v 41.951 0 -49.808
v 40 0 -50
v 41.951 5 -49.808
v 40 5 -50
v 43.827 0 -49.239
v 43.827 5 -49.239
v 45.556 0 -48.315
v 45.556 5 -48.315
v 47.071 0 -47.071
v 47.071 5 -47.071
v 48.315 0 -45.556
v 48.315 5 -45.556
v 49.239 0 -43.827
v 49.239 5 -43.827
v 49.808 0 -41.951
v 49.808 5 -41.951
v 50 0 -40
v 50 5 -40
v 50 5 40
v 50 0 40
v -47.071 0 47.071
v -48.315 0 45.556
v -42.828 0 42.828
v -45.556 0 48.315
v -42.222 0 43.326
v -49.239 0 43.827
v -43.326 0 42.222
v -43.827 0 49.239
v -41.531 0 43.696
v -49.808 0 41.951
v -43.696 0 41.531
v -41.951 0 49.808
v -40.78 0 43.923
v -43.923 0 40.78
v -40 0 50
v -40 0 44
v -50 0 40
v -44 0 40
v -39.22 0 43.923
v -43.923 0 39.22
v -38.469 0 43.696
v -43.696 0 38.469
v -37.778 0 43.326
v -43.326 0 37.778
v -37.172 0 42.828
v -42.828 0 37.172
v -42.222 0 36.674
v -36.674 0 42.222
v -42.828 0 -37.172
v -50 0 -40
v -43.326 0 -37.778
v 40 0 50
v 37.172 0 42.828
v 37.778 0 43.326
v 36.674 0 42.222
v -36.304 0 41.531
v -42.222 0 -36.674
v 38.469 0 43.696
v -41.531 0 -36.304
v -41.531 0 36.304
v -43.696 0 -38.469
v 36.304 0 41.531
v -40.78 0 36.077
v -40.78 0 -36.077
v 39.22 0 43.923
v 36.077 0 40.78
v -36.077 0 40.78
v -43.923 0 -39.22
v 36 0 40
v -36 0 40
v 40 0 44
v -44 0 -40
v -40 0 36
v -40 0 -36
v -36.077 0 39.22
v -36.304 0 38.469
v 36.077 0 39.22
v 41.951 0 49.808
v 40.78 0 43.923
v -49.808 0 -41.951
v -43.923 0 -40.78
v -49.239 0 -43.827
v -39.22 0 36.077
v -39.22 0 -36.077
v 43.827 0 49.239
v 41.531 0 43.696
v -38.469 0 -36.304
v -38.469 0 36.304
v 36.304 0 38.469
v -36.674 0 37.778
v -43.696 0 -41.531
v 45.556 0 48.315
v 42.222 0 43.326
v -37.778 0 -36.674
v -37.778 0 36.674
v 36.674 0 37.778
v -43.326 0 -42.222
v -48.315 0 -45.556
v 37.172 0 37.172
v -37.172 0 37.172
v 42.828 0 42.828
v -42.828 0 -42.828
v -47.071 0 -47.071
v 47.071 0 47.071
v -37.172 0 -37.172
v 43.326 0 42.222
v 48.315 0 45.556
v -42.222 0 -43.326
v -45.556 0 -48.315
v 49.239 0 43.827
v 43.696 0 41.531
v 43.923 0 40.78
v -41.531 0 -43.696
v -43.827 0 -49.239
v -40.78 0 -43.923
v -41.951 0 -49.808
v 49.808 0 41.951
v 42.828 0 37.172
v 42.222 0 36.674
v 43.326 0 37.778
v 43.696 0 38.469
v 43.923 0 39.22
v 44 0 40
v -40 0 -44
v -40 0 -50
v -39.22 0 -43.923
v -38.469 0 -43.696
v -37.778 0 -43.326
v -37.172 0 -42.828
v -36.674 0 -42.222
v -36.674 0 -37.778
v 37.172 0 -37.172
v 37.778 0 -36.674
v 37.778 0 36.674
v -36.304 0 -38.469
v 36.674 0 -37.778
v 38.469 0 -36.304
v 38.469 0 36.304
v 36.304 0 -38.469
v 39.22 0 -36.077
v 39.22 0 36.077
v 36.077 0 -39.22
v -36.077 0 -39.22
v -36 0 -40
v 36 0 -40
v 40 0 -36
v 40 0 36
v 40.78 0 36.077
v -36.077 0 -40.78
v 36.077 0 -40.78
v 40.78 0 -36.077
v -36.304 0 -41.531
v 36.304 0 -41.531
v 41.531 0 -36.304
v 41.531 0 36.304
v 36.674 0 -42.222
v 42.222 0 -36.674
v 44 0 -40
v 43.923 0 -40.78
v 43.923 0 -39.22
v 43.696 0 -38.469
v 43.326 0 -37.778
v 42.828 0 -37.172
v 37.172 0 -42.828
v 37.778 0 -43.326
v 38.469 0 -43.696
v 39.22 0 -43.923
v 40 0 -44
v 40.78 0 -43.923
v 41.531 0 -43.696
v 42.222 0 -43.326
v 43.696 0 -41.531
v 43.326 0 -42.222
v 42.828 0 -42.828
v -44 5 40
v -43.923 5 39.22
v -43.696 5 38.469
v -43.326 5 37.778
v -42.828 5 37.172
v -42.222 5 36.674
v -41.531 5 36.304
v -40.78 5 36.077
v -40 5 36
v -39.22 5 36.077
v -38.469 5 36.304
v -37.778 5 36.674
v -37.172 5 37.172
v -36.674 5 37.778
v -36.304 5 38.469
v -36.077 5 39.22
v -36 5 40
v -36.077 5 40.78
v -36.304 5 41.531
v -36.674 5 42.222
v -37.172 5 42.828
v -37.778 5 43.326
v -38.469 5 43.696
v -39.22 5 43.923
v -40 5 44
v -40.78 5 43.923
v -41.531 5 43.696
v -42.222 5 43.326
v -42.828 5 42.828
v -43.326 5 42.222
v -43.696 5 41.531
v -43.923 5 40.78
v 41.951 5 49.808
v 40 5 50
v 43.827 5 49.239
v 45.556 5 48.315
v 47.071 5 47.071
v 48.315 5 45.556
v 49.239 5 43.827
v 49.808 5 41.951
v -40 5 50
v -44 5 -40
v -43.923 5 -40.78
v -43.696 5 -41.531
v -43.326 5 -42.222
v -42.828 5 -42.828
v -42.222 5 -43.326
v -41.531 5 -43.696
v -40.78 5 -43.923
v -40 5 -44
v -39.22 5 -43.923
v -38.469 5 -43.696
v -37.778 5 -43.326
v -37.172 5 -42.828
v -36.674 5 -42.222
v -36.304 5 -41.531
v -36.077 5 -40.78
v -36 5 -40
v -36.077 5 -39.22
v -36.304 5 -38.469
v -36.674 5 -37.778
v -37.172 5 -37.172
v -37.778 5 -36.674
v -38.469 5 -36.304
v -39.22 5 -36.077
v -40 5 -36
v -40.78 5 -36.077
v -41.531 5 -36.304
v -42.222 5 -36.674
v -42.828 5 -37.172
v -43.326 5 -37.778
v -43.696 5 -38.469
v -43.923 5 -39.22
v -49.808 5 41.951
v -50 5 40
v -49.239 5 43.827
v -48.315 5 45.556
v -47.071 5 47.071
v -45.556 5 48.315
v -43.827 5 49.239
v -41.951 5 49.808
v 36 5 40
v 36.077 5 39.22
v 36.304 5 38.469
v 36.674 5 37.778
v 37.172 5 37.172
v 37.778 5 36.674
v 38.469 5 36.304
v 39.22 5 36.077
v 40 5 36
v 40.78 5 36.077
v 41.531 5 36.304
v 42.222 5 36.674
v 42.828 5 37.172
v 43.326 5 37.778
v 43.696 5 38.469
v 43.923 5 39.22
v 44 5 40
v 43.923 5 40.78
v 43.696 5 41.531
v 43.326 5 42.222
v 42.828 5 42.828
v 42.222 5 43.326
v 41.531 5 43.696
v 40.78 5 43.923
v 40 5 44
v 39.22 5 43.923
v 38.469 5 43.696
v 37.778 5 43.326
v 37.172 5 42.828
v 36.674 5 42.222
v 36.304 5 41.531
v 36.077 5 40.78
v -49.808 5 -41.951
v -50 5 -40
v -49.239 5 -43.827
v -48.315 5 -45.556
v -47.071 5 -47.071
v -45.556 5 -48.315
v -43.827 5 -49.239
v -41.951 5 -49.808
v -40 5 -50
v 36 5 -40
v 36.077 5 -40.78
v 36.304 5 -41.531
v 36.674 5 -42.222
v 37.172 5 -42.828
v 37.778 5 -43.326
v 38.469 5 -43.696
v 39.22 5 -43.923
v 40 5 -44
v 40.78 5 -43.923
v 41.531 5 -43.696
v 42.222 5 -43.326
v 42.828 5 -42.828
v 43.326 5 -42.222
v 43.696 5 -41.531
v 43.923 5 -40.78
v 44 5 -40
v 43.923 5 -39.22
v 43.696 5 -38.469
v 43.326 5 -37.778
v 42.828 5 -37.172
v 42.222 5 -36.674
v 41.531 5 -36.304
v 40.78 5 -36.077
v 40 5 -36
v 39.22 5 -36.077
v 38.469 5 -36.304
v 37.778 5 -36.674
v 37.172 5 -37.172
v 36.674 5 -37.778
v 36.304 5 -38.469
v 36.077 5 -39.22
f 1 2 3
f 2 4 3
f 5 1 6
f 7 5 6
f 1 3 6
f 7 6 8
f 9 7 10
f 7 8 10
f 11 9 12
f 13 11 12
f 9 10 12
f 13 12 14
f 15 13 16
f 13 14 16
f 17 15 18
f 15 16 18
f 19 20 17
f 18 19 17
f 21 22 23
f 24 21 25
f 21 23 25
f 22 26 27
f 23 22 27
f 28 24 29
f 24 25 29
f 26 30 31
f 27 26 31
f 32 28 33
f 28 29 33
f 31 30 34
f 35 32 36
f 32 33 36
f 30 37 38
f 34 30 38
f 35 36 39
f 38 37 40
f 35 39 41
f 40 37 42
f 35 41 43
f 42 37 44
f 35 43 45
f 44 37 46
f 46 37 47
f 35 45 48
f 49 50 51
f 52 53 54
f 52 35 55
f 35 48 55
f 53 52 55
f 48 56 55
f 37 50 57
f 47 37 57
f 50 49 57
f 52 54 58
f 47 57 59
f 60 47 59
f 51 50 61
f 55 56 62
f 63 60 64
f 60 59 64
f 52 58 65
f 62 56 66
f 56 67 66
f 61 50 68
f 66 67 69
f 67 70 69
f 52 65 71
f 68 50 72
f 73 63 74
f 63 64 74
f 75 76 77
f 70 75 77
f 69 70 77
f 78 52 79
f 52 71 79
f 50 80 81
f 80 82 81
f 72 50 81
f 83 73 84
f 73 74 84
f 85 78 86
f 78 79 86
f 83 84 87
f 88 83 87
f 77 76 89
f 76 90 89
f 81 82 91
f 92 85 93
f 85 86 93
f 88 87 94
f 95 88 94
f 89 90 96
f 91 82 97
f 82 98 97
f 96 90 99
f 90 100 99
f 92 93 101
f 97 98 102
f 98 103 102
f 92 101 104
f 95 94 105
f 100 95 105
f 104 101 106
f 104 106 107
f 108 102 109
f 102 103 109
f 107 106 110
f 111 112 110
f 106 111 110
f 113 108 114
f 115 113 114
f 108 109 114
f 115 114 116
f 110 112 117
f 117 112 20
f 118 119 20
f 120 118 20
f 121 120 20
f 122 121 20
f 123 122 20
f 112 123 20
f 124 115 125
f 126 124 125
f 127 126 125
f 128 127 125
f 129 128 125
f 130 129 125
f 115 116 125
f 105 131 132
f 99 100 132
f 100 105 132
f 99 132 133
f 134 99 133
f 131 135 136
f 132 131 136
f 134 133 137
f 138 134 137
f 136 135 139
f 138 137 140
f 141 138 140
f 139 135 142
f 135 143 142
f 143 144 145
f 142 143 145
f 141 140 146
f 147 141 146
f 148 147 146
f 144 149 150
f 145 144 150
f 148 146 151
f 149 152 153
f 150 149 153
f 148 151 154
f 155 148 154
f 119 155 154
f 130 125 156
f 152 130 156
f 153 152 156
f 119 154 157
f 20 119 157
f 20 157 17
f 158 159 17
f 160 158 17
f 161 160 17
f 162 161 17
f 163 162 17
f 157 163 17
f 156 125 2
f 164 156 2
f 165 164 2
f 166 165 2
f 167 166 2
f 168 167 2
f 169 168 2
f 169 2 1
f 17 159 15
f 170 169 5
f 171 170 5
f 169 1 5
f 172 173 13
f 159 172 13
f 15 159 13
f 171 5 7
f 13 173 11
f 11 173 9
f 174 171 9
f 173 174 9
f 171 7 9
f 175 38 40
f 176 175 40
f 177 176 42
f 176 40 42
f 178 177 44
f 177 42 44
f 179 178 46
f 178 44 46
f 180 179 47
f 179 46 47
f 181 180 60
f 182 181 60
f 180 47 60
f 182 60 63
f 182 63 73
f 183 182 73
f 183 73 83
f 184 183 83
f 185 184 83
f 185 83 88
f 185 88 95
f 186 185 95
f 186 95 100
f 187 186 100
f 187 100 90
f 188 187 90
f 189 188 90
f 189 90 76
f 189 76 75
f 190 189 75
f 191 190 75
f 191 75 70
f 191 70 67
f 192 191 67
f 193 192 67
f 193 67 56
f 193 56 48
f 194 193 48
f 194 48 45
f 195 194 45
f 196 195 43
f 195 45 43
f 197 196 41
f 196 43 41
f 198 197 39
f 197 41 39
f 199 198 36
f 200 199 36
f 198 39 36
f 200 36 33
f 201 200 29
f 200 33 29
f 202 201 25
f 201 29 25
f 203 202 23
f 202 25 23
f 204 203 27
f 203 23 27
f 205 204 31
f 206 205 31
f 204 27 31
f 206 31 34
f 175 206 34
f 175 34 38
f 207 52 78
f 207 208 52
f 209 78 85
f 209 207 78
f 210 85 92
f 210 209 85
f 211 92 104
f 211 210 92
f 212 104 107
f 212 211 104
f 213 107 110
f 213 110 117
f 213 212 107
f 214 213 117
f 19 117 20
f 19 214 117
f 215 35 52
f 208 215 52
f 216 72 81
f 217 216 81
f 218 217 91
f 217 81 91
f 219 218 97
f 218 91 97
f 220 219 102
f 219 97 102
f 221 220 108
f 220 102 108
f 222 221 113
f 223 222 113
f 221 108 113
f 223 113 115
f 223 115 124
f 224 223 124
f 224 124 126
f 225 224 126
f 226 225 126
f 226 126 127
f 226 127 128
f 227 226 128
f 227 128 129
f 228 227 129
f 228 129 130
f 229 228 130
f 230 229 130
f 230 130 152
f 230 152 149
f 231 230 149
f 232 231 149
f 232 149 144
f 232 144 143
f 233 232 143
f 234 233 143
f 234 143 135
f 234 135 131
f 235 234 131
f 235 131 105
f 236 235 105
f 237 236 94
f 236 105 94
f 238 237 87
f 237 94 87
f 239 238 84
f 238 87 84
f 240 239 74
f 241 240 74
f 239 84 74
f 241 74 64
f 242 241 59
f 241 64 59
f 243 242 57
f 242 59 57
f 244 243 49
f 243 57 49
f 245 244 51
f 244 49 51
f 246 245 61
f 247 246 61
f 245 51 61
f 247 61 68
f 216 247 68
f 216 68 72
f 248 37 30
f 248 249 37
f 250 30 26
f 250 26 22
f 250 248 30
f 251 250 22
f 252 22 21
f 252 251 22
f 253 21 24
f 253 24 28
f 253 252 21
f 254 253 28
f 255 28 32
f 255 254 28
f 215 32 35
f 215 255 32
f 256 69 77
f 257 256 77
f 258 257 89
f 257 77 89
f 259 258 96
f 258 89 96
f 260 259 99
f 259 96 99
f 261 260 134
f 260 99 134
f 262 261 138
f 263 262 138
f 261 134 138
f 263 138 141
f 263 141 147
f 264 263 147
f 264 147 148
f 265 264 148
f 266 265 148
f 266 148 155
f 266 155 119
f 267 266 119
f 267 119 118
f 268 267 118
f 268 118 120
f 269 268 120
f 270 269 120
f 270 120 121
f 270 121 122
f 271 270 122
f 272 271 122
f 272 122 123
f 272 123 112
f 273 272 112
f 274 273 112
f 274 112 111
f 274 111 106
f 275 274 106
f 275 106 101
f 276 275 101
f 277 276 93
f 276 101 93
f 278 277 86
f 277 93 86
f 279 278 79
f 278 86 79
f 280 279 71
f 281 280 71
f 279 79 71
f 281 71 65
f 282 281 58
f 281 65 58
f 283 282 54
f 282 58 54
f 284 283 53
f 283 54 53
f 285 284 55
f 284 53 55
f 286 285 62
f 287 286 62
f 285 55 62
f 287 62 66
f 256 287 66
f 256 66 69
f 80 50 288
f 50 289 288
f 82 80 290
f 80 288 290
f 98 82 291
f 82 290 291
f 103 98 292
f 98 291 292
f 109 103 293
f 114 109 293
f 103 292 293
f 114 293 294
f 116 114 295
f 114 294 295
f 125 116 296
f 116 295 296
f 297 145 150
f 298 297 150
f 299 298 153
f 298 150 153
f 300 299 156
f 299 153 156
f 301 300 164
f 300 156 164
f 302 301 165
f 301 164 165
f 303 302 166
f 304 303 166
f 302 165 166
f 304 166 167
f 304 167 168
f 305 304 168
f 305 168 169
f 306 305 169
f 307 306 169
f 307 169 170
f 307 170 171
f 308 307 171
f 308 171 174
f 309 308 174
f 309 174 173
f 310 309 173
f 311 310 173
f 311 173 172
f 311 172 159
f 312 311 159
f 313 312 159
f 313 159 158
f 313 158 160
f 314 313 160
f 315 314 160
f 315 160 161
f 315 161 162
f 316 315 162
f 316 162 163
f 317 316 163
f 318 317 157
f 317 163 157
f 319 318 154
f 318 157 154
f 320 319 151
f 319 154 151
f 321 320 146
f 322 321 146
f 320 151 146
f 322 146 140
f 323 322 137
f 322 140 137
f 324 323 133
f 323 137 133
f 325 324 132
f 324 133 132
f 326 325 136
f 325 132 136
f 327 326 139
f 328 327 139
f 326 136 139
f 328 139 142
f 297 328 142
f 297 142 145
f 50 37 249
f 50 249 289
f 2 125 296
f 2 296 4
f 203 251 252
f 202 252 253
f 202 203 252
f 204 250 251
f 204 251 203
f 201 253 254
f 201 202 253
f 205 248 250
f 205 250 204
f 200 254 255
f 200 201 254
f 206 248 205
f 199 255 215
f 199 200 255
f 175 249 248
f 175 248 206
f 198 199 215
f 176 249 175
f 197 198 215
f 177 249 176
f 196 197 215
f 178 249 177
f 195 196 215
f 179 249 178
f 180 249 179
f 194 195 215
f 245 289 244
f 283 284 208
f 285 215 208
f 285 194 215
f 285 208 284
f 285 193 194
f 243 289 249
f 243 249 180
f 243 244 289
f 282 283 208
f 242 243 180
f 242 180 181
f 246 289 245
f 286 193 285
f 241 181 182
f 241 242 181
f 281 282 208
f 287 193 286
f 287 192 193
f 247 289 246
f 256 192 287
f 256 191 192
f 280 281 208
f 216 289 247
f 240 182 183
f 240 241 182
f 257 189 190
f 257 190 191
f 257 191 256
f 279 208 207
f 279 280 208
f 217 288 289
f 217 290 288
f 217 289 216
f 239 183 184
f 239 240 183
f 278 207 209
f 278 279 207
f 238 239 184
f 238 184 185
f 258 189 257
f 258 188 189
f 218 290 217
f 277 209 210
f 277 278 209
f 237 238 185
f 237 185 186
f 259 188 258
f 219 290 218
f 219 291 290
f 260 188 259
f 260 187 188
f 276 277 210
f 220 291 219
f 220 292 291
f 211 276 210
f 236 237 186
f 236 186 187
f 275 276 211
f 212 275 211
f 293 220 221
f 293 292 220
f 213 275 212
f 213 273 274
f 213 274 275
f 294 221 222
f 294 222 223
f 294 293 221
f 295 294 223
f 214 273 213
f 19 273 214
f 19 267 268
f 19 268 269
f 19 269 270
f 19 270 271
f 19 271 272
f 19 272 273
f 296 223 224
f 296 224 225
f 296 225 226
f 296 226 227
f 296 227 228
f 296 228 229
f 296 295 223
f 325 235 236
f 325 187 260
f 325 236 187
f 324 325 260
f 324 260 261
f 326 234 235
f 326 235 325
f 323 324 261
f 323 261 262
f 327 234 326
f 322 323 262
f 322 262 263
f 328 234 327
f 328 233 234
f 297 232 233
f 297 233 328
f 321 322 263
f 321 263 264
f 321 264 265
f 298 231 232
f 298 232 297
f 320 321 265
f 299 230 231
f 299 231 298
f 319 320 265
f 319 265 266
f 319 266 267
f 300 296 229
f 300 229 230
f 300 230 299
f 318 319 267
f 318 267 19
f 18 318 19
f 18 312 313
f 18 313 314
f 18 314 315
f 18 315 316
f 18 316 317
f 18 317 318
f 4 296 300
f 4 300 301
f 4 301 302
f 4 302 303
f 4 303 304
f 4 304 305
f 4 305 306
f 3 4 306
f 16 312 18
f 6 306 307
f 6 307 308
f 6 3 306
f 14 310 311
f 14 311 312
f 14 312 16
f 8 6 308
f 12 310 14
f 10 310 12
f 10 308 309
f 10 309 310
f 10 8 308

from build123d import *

# Parameters (mm, degrees)
SKETCH1_W                 = 100
SKETCH1_H                 = 100
BOSS_EXTRUDE1_DEPTH       = 5
F_8_0MM_DOWEL_HOLE1_D     = 8
F_8_0MM_DOWEL_HOLE1_DEPTH = 5
FILLET1_R                 = 10


with BuildPart() as part:
    # Sketch1 → Boss-Extrude1 (new body)
    with BuildSketch(Plane(origin=(0, 0, 0), x_dir=(1, 0, 0), z_dir=(0, 1, 0))):
        Rectangle(SKETCH1_W, SKETCH1_H)
    extrude(amount=BOSS_EXTRUDE1_DEPTH)

    # Ø8.0mm Dowel Hole1
    with Locations(Plane(origin=(0, 5, 0), x_dir=(1, 0, 0), z_dir=(0, 1, 0))):
        with Locations((-40, -40), (-40, 40), (40, 40), (40, -40)):
            Hole(F_8_0MM_DOWEL_HOLE1_D / 2, depth=F_8_0MM_DOWEL_HOLE1_DEPTH)

    # Fillet1
    fillet1_edges = [part.edges().sort_by_distance(p)[0] for p in [
        (-50, 2.5, -50),
        (50, 2.5, -50),
        (50, 2.5, 50),
        (-50, 2.5, 50),
    ]]
    fillet(fillet1_edges, radius=FILLET1_R)


solid = part.part
